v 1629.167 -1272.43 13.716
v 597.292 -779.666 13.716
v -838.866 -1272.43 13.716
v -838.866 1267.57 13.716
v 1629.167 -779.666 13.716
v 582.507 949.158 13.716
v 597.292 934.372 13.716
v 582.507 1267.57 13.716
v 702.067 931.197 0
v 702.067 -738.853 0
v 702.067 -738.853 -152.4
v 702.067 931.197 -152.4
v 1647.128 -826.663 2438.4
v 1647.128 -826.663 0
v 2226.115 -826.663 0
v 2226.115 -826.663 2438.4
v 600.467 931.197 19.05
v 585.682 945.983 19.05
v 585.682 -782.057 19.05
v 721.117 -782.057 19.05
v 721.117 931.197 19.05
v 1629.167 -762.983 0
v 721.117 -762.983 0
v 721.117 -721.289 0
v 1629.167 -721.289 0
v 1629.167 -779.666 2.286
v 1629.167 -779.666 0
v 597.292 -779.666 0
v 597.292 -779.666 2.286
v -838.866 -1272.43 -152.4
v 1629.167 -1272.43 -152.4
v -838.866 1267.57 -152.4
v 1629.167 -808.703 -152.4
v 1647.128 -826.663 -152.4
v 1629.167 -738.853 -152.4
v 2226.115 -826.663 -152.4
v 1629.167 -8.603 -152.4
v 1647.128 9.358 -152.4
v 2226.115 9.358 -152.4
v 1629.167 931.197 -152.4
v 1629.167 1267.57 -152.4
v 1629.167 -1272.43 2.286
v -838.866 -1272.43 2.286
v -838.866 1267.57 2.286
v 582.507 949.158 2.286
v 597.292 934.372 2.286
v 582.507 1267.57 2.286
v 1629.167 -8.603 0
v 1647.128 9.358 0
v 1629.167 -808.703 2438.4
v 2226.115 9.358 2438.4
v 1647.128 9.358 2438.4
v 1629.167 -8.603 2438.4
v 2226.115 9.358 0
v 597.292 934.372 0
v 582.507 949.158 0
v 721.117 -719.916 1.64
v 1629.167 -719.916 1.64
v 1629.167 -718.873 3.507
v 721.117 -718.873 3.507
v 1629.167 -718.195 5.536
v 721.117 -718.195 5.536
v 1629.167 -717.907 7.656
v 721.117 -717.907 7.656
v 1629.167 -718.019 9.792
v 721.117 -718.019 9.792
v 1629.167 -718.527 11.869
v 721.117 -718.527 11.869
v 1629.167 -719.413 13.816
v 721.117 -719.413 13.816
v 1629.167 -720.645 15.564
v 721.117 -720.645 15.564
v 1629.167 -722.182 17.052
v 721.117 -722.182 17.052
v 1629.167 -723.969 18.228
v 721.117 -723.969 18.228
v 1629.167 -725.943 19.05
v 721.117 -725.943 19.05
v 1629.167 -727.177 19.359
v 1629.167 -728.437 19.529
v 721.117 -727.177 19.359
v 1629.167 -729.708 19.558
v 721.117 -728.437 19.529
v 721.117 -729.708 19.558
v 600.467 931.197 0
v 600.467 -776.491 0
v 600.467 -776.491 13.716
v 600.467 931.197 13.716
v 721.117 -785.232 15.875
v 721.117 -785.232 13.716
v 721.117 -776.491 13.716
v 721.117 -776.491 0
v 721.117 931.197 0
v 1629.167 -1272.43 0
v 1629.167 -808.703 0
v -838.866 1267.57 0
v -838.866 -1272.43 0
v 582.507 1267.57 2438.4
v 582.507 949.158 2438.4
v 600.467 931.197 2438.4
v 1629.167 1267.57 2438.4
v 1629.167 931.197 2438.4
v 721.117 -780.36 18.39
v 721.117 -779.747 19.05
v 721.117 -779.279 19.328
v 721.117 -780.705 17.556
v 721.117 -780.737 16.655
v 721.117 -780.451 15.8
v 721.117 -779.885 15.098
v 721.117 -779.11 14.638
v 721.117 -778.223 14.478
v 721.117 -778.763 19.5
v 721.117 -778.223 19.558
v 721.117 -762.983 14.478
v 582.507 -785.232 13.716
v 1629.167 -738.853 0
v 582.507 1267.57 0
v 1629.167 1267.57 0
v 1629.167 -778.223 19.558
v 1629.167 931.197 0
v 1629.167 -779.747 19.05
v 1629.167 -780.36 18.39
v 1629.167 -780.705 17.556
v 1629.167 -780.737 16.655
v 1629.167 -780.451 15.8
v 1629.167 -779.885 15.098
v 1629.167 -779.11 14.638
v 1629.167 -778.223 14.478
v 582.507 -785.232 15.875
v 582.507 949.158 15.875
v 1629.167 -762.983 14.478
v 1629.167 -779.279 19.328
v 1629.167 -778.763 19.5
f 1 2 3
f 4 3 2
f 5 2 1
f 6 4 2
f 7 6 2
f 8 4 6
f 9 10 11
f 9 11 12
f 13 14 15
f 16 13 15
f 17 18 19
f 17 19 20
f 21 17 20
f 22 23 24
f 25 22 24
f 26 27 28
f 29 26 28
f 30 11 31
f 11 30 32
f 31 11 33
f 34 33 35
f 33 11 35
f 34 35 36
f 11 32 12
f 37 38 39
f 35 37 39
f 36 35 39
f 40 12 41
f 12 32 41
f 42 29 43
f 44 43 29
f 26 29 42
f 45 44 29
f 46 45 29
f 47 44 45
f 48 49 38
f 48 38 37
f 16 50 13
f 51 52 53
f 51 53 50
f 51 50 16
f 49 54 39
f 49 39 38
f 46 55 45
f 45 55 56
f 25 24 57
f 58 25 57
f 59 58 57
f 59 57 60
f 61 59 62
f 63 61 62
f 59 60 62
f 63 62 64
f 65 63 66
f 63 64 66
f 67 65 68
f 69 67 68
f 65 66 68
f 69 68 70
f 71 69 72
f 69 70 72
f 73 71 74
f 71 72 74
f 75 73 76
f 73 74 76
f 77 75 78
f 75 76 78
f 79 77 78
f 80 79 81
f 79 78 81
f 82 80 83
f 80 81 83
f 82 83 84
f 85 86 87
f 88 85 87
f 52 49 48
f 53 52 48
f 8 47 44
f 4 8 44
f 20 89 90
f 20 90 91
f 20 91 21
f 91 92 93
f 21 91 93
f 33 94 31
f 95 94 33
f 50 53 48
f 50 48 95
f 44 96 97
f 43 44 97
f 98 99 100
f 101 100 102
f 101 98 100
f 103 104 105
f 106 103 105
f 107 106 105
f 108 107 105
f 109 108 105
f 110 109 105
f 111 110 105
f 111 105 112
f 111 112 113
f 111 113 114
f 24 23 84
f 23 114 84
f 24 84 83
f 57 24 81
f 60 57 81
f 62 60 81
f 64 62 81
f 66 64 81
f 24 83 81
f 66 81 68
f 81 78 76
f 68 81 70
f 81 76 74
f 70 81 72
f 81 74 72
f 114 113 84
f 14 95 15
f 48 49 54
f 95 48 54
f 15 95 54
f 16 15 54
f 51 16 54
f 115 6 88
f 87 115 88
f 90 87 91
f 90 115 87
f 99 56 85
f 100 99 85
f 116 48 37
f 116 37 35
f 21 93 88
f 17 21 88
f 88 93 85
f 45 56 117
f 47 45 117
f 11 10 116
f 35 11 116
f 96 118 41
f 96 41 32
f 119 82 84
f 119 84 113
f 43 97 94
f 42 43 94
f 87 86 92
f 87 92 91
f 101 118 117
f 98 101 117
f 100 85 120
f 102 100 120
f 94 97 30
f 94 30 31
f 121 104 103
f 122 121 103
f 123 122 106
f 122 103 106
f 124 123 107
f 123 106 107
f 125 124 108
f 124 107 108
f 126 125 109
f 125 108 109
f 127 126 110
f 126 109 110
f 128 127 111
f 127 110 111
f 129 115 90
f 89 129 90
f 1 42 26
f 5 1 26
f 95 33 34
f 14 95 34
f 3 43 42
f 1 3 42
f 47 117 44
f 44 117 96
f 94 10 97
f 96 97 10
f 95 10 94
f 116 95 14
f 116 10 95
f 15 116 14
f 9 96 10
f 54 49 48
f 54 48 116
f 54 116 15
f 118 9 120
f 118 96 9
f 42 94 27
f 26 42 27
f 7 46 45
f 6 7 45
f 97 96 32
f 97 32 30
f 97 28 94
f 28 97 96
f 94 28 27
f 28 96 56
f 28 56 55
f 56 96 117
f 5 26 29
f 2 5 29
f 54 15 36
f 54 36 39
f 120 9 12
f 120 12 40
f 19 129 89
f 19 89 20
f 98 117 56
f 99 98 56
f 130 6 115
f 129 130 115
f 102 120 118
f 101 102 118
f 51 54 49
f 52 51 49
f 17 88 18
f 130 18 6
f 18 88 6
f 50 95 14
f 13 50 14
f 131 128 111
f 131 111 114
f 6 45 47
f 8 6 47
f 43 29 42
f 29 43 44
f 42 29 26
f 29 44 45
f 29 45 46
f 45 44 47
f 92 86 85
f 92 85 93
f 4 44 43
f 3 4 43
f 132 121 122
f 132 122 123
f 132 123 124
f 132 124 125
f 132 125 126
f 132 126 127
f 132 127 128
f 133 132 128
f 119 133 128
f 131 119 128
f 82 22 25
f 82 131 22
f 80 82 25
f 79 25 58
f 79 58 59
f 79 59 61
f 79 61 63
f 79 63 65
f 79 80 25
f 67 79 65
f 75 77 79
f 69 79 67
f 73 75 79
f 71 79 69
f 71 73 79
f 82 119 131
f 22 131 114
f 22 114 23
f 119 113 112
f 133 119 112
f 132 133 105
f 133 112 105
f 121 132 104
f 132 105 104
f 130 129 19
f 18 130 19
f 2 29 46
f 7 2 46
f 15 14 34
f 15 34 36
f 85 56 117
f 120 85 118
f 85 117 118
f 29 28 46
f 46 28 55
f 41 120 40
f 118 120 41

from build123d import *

# Parameters (mm, degrees)
F0_W      = 927.1
F0_H      = 336.3721848547
F0_H_2    = 533.5778151453
F1_DEPTH  = 152.4
F3_DEPTH  = 2438.4
F5_DEPTH  = 152.4
F6_DEPTH  = 2438.4
F7_W      = 19.05
F7_H      = 1670.05
F8_DEPTH  = 19.05
F10_DEPTH = 2.286
F11_DEPTH = 11.43
F13_DEPTH = 908.05
F15_DEPTH = 2052.8028121924
F16_W     = 17.9605122421
F16_H     = 13.716
F17_DEPTH = 2052.8028121924
F19_DEPTH = 1559.9841734515
F20_W     = 8.7408832695
F20_H     = 13.716
F21_DEPTH = 1559.9841734515


with BuildPart() as f1:
    # F0 (on Top) → F1 (new body)
    with BuildSketch(Plane.XY):
        Polygon((702.067170443, 931.1973798752), (702.067170443, 1267.5695647299), (-838.8660030085, 1267.5695647299), (-838.8660030085, -1272.4304352701), (702.067170443, -1272.4304352701), (702.067170443, -738.8526201248), align=None)
        with Locations((1165.617170443, 1099.3834723026)):
            Rectangle(F0_W, F0_H)
        with Locations((1165.617170443, -1005.6415276974)):
            Rectangle(F0_W, F0_H_2)
    extrude(amount=-F1_DEPTH)

    # F4 (on face) → F5 (join, through all)
    with BuildSketch(Plane.XY):
        Polygon((1629.167170443, -738.8526201248), (1629.167170443, -808.7026201248), (1647.1276826851, -826.663132367), (2226.1154003136, -826.663132367), (2226.1154003136, 9.3578921173), (1647.1276826851, 9.3578921173), (1629.167170443, -8.6026201248), align=None)
    extrude(amount=-F5_DEPTH)


with BuildPart() as f3:
    # F2 (on face) → F3 (new body)
    with BuildSketch(Plane.XY):
        Polygon((600.467170443, 931.1973798752), (702.067170443, 931.1973798752), (1629.167170443, 931.1973798752), (1629.167170443, 1267.5695647299), (582.5066582008, 1267.5695647299), (582.5066582008, 949.1578921173), align=None)
    extrude(amount=F3_DEPTH)


with BuildPart() as f6:
    # F4 (on face) → F6 (new body, through all)
    with BuildSketch(Plane.XY):
        Polygon((1629.167170443, -738.8526201248), (1629.167170443, -808.7026201248), (1647.1276826851, -826.663132367), (2226.1154003136, -826.663132367), (2226.1154003136, 9.3578921173), (1647.1276826851, 9.3578921173), (1629.167170443, -8.6026201248), align=None)
    extrude(amount=F6_DEPTH)


with BuildPart() as f8:
    # F7 (on face) → F8 (new body)
    with BuildSketch(Plane.XY):
        Polygon((702.067170443, 931.1973798752), (600.467170443, 931.1973798752), (582.5066582008, 949.1578921173), (582.5066582008, -785.2322474625), (721.117170443, -785.2322474625), (721.117170443, -738.8526201248), (702.067170443, -738.8526201248), align=None)
        with Locations((711.592170443, 96.1723798752)):
            Rectangle(F7_W, F7_H)
    extrude(amount=F8_DEPTH)

    # F14 (on face) → F15 (cut, through all)
    with BuildSketch(Plane.XZ.offset(785.2322474625)):
        Polygon((582.5066582008, 15.875), (585.6816582008, 19.05), (582.5066582008, 19.05), align=None)
    extrude(amount=-F15_DEPTH, mode=Mode.SUBTRACT)

    # F16 (on face) → F17 (cut, through all)
    with BuildSketch(Plane.XZ.offset(785.2322474625)):
        with Locations((591.4869143219, 6.858)):
            Rectangle(F16_W, F16_H)
    extrude(amount=-F17_DEPTH, mode=Mode.SUBTRACT)

    # F18 (on face) → F19 (cut, through all)
    with BuildSketch(Plane.YZ.offset(721.117170443)):
        Polygon((-782.0572474625, 19.05), (-785.2322474625, 19.05), (-785.2322474625, 15.875), align=None)
    extrude(amount=-F19_DEPTH, mode=Mode.SUBTRACT)

    # F20 (on face) → F21 (cut, through all)
    with BuildSketch(Plane.YZ.offset(721.117170443)):
        with Locations((-780.8618058277, 6.858)):
            Rectangle(F20_W, F20_H)
    extrude(amount=-F21_DEPTH, mode=Mode.SUBTRACT)


with BuildPart() as f10:
    # F9 (on face) → F10 (new body)
    with BuildSketch(Plane.XY):
        Polygon((582.5066582008, 949.1578921173), (582.5066582008, 1267.5695647299), (-838.8660030085, 1267.5695647299), (-838.8660030085, -1272.4304352701), (1629.167170443, -1272.4304352701), (1629.167170443, -808.7026201248), (1629.167170443, -779.666364193), (597.292170443, -779.666364193), (597.292170443, 934.3723798752), align=None)
    extrude(amount=F10_DEPTH)


with BuildPart() as f11:
    # F11 (new): a face of the model
    f11_faces = [f10.part.faces().sort_by_distance(p)[0] for p in [
        (29.5294646576, -129.086705172, 2.286),
    ]]
    extrude(f11_faces, amount=F11_DEPTH)


with BuildPart() as f13:
    # F12 (on face) → F13 (new body, through all)
    with BuildSketch(Plane.YZ.offset(721.117170443)):
        with BuildLine():
            Line((-762.9826201248, 0), (-738.8526201248, 0))
            Line((-738.8526201248, 0), (-721.2888350697, 0))
            ThreePointArc((-721.2888350697, 0), (-718.2244131725, 10.8423506116), (-725.9433340729, 19.05))
            Line((-725.9433340729, 19.05), (-779.7466201248, 19.05))
            ThreePointArc((-779.7466201248, 19.05), (-780.6322757019, 16.2147814743), (-778.2226201248, 14.478))
            Line((-778.2226201248, 14.478), (-762.9826201248, 14.478))
            Line((-762.9826201248, 14.478), (-762.9826201248, 0))
        make_face()
        with BuildLine():
            Line((-779.7466201248, 19.05), (-725.9433340729, 19.05))
            ThreePointArc((-725.9433340729, 19.05), (-727.8044343417, 19.4614100495), (-729.7080159187, 19.558))
            Line((-729.7080159187, 19.558), (-778.2226201248, 19.558))
            ThreePointArc((-778.2226201248, 19.558), (-779.0258386505, 19.427655577), (-779.7466201248, 19.05))
        make_face()
    extrude(amount=F13_DEPTH)


solid = Compound([f1.part, f3.part, f6.part, f8.part, f10.part, f11.part, f13.part])
